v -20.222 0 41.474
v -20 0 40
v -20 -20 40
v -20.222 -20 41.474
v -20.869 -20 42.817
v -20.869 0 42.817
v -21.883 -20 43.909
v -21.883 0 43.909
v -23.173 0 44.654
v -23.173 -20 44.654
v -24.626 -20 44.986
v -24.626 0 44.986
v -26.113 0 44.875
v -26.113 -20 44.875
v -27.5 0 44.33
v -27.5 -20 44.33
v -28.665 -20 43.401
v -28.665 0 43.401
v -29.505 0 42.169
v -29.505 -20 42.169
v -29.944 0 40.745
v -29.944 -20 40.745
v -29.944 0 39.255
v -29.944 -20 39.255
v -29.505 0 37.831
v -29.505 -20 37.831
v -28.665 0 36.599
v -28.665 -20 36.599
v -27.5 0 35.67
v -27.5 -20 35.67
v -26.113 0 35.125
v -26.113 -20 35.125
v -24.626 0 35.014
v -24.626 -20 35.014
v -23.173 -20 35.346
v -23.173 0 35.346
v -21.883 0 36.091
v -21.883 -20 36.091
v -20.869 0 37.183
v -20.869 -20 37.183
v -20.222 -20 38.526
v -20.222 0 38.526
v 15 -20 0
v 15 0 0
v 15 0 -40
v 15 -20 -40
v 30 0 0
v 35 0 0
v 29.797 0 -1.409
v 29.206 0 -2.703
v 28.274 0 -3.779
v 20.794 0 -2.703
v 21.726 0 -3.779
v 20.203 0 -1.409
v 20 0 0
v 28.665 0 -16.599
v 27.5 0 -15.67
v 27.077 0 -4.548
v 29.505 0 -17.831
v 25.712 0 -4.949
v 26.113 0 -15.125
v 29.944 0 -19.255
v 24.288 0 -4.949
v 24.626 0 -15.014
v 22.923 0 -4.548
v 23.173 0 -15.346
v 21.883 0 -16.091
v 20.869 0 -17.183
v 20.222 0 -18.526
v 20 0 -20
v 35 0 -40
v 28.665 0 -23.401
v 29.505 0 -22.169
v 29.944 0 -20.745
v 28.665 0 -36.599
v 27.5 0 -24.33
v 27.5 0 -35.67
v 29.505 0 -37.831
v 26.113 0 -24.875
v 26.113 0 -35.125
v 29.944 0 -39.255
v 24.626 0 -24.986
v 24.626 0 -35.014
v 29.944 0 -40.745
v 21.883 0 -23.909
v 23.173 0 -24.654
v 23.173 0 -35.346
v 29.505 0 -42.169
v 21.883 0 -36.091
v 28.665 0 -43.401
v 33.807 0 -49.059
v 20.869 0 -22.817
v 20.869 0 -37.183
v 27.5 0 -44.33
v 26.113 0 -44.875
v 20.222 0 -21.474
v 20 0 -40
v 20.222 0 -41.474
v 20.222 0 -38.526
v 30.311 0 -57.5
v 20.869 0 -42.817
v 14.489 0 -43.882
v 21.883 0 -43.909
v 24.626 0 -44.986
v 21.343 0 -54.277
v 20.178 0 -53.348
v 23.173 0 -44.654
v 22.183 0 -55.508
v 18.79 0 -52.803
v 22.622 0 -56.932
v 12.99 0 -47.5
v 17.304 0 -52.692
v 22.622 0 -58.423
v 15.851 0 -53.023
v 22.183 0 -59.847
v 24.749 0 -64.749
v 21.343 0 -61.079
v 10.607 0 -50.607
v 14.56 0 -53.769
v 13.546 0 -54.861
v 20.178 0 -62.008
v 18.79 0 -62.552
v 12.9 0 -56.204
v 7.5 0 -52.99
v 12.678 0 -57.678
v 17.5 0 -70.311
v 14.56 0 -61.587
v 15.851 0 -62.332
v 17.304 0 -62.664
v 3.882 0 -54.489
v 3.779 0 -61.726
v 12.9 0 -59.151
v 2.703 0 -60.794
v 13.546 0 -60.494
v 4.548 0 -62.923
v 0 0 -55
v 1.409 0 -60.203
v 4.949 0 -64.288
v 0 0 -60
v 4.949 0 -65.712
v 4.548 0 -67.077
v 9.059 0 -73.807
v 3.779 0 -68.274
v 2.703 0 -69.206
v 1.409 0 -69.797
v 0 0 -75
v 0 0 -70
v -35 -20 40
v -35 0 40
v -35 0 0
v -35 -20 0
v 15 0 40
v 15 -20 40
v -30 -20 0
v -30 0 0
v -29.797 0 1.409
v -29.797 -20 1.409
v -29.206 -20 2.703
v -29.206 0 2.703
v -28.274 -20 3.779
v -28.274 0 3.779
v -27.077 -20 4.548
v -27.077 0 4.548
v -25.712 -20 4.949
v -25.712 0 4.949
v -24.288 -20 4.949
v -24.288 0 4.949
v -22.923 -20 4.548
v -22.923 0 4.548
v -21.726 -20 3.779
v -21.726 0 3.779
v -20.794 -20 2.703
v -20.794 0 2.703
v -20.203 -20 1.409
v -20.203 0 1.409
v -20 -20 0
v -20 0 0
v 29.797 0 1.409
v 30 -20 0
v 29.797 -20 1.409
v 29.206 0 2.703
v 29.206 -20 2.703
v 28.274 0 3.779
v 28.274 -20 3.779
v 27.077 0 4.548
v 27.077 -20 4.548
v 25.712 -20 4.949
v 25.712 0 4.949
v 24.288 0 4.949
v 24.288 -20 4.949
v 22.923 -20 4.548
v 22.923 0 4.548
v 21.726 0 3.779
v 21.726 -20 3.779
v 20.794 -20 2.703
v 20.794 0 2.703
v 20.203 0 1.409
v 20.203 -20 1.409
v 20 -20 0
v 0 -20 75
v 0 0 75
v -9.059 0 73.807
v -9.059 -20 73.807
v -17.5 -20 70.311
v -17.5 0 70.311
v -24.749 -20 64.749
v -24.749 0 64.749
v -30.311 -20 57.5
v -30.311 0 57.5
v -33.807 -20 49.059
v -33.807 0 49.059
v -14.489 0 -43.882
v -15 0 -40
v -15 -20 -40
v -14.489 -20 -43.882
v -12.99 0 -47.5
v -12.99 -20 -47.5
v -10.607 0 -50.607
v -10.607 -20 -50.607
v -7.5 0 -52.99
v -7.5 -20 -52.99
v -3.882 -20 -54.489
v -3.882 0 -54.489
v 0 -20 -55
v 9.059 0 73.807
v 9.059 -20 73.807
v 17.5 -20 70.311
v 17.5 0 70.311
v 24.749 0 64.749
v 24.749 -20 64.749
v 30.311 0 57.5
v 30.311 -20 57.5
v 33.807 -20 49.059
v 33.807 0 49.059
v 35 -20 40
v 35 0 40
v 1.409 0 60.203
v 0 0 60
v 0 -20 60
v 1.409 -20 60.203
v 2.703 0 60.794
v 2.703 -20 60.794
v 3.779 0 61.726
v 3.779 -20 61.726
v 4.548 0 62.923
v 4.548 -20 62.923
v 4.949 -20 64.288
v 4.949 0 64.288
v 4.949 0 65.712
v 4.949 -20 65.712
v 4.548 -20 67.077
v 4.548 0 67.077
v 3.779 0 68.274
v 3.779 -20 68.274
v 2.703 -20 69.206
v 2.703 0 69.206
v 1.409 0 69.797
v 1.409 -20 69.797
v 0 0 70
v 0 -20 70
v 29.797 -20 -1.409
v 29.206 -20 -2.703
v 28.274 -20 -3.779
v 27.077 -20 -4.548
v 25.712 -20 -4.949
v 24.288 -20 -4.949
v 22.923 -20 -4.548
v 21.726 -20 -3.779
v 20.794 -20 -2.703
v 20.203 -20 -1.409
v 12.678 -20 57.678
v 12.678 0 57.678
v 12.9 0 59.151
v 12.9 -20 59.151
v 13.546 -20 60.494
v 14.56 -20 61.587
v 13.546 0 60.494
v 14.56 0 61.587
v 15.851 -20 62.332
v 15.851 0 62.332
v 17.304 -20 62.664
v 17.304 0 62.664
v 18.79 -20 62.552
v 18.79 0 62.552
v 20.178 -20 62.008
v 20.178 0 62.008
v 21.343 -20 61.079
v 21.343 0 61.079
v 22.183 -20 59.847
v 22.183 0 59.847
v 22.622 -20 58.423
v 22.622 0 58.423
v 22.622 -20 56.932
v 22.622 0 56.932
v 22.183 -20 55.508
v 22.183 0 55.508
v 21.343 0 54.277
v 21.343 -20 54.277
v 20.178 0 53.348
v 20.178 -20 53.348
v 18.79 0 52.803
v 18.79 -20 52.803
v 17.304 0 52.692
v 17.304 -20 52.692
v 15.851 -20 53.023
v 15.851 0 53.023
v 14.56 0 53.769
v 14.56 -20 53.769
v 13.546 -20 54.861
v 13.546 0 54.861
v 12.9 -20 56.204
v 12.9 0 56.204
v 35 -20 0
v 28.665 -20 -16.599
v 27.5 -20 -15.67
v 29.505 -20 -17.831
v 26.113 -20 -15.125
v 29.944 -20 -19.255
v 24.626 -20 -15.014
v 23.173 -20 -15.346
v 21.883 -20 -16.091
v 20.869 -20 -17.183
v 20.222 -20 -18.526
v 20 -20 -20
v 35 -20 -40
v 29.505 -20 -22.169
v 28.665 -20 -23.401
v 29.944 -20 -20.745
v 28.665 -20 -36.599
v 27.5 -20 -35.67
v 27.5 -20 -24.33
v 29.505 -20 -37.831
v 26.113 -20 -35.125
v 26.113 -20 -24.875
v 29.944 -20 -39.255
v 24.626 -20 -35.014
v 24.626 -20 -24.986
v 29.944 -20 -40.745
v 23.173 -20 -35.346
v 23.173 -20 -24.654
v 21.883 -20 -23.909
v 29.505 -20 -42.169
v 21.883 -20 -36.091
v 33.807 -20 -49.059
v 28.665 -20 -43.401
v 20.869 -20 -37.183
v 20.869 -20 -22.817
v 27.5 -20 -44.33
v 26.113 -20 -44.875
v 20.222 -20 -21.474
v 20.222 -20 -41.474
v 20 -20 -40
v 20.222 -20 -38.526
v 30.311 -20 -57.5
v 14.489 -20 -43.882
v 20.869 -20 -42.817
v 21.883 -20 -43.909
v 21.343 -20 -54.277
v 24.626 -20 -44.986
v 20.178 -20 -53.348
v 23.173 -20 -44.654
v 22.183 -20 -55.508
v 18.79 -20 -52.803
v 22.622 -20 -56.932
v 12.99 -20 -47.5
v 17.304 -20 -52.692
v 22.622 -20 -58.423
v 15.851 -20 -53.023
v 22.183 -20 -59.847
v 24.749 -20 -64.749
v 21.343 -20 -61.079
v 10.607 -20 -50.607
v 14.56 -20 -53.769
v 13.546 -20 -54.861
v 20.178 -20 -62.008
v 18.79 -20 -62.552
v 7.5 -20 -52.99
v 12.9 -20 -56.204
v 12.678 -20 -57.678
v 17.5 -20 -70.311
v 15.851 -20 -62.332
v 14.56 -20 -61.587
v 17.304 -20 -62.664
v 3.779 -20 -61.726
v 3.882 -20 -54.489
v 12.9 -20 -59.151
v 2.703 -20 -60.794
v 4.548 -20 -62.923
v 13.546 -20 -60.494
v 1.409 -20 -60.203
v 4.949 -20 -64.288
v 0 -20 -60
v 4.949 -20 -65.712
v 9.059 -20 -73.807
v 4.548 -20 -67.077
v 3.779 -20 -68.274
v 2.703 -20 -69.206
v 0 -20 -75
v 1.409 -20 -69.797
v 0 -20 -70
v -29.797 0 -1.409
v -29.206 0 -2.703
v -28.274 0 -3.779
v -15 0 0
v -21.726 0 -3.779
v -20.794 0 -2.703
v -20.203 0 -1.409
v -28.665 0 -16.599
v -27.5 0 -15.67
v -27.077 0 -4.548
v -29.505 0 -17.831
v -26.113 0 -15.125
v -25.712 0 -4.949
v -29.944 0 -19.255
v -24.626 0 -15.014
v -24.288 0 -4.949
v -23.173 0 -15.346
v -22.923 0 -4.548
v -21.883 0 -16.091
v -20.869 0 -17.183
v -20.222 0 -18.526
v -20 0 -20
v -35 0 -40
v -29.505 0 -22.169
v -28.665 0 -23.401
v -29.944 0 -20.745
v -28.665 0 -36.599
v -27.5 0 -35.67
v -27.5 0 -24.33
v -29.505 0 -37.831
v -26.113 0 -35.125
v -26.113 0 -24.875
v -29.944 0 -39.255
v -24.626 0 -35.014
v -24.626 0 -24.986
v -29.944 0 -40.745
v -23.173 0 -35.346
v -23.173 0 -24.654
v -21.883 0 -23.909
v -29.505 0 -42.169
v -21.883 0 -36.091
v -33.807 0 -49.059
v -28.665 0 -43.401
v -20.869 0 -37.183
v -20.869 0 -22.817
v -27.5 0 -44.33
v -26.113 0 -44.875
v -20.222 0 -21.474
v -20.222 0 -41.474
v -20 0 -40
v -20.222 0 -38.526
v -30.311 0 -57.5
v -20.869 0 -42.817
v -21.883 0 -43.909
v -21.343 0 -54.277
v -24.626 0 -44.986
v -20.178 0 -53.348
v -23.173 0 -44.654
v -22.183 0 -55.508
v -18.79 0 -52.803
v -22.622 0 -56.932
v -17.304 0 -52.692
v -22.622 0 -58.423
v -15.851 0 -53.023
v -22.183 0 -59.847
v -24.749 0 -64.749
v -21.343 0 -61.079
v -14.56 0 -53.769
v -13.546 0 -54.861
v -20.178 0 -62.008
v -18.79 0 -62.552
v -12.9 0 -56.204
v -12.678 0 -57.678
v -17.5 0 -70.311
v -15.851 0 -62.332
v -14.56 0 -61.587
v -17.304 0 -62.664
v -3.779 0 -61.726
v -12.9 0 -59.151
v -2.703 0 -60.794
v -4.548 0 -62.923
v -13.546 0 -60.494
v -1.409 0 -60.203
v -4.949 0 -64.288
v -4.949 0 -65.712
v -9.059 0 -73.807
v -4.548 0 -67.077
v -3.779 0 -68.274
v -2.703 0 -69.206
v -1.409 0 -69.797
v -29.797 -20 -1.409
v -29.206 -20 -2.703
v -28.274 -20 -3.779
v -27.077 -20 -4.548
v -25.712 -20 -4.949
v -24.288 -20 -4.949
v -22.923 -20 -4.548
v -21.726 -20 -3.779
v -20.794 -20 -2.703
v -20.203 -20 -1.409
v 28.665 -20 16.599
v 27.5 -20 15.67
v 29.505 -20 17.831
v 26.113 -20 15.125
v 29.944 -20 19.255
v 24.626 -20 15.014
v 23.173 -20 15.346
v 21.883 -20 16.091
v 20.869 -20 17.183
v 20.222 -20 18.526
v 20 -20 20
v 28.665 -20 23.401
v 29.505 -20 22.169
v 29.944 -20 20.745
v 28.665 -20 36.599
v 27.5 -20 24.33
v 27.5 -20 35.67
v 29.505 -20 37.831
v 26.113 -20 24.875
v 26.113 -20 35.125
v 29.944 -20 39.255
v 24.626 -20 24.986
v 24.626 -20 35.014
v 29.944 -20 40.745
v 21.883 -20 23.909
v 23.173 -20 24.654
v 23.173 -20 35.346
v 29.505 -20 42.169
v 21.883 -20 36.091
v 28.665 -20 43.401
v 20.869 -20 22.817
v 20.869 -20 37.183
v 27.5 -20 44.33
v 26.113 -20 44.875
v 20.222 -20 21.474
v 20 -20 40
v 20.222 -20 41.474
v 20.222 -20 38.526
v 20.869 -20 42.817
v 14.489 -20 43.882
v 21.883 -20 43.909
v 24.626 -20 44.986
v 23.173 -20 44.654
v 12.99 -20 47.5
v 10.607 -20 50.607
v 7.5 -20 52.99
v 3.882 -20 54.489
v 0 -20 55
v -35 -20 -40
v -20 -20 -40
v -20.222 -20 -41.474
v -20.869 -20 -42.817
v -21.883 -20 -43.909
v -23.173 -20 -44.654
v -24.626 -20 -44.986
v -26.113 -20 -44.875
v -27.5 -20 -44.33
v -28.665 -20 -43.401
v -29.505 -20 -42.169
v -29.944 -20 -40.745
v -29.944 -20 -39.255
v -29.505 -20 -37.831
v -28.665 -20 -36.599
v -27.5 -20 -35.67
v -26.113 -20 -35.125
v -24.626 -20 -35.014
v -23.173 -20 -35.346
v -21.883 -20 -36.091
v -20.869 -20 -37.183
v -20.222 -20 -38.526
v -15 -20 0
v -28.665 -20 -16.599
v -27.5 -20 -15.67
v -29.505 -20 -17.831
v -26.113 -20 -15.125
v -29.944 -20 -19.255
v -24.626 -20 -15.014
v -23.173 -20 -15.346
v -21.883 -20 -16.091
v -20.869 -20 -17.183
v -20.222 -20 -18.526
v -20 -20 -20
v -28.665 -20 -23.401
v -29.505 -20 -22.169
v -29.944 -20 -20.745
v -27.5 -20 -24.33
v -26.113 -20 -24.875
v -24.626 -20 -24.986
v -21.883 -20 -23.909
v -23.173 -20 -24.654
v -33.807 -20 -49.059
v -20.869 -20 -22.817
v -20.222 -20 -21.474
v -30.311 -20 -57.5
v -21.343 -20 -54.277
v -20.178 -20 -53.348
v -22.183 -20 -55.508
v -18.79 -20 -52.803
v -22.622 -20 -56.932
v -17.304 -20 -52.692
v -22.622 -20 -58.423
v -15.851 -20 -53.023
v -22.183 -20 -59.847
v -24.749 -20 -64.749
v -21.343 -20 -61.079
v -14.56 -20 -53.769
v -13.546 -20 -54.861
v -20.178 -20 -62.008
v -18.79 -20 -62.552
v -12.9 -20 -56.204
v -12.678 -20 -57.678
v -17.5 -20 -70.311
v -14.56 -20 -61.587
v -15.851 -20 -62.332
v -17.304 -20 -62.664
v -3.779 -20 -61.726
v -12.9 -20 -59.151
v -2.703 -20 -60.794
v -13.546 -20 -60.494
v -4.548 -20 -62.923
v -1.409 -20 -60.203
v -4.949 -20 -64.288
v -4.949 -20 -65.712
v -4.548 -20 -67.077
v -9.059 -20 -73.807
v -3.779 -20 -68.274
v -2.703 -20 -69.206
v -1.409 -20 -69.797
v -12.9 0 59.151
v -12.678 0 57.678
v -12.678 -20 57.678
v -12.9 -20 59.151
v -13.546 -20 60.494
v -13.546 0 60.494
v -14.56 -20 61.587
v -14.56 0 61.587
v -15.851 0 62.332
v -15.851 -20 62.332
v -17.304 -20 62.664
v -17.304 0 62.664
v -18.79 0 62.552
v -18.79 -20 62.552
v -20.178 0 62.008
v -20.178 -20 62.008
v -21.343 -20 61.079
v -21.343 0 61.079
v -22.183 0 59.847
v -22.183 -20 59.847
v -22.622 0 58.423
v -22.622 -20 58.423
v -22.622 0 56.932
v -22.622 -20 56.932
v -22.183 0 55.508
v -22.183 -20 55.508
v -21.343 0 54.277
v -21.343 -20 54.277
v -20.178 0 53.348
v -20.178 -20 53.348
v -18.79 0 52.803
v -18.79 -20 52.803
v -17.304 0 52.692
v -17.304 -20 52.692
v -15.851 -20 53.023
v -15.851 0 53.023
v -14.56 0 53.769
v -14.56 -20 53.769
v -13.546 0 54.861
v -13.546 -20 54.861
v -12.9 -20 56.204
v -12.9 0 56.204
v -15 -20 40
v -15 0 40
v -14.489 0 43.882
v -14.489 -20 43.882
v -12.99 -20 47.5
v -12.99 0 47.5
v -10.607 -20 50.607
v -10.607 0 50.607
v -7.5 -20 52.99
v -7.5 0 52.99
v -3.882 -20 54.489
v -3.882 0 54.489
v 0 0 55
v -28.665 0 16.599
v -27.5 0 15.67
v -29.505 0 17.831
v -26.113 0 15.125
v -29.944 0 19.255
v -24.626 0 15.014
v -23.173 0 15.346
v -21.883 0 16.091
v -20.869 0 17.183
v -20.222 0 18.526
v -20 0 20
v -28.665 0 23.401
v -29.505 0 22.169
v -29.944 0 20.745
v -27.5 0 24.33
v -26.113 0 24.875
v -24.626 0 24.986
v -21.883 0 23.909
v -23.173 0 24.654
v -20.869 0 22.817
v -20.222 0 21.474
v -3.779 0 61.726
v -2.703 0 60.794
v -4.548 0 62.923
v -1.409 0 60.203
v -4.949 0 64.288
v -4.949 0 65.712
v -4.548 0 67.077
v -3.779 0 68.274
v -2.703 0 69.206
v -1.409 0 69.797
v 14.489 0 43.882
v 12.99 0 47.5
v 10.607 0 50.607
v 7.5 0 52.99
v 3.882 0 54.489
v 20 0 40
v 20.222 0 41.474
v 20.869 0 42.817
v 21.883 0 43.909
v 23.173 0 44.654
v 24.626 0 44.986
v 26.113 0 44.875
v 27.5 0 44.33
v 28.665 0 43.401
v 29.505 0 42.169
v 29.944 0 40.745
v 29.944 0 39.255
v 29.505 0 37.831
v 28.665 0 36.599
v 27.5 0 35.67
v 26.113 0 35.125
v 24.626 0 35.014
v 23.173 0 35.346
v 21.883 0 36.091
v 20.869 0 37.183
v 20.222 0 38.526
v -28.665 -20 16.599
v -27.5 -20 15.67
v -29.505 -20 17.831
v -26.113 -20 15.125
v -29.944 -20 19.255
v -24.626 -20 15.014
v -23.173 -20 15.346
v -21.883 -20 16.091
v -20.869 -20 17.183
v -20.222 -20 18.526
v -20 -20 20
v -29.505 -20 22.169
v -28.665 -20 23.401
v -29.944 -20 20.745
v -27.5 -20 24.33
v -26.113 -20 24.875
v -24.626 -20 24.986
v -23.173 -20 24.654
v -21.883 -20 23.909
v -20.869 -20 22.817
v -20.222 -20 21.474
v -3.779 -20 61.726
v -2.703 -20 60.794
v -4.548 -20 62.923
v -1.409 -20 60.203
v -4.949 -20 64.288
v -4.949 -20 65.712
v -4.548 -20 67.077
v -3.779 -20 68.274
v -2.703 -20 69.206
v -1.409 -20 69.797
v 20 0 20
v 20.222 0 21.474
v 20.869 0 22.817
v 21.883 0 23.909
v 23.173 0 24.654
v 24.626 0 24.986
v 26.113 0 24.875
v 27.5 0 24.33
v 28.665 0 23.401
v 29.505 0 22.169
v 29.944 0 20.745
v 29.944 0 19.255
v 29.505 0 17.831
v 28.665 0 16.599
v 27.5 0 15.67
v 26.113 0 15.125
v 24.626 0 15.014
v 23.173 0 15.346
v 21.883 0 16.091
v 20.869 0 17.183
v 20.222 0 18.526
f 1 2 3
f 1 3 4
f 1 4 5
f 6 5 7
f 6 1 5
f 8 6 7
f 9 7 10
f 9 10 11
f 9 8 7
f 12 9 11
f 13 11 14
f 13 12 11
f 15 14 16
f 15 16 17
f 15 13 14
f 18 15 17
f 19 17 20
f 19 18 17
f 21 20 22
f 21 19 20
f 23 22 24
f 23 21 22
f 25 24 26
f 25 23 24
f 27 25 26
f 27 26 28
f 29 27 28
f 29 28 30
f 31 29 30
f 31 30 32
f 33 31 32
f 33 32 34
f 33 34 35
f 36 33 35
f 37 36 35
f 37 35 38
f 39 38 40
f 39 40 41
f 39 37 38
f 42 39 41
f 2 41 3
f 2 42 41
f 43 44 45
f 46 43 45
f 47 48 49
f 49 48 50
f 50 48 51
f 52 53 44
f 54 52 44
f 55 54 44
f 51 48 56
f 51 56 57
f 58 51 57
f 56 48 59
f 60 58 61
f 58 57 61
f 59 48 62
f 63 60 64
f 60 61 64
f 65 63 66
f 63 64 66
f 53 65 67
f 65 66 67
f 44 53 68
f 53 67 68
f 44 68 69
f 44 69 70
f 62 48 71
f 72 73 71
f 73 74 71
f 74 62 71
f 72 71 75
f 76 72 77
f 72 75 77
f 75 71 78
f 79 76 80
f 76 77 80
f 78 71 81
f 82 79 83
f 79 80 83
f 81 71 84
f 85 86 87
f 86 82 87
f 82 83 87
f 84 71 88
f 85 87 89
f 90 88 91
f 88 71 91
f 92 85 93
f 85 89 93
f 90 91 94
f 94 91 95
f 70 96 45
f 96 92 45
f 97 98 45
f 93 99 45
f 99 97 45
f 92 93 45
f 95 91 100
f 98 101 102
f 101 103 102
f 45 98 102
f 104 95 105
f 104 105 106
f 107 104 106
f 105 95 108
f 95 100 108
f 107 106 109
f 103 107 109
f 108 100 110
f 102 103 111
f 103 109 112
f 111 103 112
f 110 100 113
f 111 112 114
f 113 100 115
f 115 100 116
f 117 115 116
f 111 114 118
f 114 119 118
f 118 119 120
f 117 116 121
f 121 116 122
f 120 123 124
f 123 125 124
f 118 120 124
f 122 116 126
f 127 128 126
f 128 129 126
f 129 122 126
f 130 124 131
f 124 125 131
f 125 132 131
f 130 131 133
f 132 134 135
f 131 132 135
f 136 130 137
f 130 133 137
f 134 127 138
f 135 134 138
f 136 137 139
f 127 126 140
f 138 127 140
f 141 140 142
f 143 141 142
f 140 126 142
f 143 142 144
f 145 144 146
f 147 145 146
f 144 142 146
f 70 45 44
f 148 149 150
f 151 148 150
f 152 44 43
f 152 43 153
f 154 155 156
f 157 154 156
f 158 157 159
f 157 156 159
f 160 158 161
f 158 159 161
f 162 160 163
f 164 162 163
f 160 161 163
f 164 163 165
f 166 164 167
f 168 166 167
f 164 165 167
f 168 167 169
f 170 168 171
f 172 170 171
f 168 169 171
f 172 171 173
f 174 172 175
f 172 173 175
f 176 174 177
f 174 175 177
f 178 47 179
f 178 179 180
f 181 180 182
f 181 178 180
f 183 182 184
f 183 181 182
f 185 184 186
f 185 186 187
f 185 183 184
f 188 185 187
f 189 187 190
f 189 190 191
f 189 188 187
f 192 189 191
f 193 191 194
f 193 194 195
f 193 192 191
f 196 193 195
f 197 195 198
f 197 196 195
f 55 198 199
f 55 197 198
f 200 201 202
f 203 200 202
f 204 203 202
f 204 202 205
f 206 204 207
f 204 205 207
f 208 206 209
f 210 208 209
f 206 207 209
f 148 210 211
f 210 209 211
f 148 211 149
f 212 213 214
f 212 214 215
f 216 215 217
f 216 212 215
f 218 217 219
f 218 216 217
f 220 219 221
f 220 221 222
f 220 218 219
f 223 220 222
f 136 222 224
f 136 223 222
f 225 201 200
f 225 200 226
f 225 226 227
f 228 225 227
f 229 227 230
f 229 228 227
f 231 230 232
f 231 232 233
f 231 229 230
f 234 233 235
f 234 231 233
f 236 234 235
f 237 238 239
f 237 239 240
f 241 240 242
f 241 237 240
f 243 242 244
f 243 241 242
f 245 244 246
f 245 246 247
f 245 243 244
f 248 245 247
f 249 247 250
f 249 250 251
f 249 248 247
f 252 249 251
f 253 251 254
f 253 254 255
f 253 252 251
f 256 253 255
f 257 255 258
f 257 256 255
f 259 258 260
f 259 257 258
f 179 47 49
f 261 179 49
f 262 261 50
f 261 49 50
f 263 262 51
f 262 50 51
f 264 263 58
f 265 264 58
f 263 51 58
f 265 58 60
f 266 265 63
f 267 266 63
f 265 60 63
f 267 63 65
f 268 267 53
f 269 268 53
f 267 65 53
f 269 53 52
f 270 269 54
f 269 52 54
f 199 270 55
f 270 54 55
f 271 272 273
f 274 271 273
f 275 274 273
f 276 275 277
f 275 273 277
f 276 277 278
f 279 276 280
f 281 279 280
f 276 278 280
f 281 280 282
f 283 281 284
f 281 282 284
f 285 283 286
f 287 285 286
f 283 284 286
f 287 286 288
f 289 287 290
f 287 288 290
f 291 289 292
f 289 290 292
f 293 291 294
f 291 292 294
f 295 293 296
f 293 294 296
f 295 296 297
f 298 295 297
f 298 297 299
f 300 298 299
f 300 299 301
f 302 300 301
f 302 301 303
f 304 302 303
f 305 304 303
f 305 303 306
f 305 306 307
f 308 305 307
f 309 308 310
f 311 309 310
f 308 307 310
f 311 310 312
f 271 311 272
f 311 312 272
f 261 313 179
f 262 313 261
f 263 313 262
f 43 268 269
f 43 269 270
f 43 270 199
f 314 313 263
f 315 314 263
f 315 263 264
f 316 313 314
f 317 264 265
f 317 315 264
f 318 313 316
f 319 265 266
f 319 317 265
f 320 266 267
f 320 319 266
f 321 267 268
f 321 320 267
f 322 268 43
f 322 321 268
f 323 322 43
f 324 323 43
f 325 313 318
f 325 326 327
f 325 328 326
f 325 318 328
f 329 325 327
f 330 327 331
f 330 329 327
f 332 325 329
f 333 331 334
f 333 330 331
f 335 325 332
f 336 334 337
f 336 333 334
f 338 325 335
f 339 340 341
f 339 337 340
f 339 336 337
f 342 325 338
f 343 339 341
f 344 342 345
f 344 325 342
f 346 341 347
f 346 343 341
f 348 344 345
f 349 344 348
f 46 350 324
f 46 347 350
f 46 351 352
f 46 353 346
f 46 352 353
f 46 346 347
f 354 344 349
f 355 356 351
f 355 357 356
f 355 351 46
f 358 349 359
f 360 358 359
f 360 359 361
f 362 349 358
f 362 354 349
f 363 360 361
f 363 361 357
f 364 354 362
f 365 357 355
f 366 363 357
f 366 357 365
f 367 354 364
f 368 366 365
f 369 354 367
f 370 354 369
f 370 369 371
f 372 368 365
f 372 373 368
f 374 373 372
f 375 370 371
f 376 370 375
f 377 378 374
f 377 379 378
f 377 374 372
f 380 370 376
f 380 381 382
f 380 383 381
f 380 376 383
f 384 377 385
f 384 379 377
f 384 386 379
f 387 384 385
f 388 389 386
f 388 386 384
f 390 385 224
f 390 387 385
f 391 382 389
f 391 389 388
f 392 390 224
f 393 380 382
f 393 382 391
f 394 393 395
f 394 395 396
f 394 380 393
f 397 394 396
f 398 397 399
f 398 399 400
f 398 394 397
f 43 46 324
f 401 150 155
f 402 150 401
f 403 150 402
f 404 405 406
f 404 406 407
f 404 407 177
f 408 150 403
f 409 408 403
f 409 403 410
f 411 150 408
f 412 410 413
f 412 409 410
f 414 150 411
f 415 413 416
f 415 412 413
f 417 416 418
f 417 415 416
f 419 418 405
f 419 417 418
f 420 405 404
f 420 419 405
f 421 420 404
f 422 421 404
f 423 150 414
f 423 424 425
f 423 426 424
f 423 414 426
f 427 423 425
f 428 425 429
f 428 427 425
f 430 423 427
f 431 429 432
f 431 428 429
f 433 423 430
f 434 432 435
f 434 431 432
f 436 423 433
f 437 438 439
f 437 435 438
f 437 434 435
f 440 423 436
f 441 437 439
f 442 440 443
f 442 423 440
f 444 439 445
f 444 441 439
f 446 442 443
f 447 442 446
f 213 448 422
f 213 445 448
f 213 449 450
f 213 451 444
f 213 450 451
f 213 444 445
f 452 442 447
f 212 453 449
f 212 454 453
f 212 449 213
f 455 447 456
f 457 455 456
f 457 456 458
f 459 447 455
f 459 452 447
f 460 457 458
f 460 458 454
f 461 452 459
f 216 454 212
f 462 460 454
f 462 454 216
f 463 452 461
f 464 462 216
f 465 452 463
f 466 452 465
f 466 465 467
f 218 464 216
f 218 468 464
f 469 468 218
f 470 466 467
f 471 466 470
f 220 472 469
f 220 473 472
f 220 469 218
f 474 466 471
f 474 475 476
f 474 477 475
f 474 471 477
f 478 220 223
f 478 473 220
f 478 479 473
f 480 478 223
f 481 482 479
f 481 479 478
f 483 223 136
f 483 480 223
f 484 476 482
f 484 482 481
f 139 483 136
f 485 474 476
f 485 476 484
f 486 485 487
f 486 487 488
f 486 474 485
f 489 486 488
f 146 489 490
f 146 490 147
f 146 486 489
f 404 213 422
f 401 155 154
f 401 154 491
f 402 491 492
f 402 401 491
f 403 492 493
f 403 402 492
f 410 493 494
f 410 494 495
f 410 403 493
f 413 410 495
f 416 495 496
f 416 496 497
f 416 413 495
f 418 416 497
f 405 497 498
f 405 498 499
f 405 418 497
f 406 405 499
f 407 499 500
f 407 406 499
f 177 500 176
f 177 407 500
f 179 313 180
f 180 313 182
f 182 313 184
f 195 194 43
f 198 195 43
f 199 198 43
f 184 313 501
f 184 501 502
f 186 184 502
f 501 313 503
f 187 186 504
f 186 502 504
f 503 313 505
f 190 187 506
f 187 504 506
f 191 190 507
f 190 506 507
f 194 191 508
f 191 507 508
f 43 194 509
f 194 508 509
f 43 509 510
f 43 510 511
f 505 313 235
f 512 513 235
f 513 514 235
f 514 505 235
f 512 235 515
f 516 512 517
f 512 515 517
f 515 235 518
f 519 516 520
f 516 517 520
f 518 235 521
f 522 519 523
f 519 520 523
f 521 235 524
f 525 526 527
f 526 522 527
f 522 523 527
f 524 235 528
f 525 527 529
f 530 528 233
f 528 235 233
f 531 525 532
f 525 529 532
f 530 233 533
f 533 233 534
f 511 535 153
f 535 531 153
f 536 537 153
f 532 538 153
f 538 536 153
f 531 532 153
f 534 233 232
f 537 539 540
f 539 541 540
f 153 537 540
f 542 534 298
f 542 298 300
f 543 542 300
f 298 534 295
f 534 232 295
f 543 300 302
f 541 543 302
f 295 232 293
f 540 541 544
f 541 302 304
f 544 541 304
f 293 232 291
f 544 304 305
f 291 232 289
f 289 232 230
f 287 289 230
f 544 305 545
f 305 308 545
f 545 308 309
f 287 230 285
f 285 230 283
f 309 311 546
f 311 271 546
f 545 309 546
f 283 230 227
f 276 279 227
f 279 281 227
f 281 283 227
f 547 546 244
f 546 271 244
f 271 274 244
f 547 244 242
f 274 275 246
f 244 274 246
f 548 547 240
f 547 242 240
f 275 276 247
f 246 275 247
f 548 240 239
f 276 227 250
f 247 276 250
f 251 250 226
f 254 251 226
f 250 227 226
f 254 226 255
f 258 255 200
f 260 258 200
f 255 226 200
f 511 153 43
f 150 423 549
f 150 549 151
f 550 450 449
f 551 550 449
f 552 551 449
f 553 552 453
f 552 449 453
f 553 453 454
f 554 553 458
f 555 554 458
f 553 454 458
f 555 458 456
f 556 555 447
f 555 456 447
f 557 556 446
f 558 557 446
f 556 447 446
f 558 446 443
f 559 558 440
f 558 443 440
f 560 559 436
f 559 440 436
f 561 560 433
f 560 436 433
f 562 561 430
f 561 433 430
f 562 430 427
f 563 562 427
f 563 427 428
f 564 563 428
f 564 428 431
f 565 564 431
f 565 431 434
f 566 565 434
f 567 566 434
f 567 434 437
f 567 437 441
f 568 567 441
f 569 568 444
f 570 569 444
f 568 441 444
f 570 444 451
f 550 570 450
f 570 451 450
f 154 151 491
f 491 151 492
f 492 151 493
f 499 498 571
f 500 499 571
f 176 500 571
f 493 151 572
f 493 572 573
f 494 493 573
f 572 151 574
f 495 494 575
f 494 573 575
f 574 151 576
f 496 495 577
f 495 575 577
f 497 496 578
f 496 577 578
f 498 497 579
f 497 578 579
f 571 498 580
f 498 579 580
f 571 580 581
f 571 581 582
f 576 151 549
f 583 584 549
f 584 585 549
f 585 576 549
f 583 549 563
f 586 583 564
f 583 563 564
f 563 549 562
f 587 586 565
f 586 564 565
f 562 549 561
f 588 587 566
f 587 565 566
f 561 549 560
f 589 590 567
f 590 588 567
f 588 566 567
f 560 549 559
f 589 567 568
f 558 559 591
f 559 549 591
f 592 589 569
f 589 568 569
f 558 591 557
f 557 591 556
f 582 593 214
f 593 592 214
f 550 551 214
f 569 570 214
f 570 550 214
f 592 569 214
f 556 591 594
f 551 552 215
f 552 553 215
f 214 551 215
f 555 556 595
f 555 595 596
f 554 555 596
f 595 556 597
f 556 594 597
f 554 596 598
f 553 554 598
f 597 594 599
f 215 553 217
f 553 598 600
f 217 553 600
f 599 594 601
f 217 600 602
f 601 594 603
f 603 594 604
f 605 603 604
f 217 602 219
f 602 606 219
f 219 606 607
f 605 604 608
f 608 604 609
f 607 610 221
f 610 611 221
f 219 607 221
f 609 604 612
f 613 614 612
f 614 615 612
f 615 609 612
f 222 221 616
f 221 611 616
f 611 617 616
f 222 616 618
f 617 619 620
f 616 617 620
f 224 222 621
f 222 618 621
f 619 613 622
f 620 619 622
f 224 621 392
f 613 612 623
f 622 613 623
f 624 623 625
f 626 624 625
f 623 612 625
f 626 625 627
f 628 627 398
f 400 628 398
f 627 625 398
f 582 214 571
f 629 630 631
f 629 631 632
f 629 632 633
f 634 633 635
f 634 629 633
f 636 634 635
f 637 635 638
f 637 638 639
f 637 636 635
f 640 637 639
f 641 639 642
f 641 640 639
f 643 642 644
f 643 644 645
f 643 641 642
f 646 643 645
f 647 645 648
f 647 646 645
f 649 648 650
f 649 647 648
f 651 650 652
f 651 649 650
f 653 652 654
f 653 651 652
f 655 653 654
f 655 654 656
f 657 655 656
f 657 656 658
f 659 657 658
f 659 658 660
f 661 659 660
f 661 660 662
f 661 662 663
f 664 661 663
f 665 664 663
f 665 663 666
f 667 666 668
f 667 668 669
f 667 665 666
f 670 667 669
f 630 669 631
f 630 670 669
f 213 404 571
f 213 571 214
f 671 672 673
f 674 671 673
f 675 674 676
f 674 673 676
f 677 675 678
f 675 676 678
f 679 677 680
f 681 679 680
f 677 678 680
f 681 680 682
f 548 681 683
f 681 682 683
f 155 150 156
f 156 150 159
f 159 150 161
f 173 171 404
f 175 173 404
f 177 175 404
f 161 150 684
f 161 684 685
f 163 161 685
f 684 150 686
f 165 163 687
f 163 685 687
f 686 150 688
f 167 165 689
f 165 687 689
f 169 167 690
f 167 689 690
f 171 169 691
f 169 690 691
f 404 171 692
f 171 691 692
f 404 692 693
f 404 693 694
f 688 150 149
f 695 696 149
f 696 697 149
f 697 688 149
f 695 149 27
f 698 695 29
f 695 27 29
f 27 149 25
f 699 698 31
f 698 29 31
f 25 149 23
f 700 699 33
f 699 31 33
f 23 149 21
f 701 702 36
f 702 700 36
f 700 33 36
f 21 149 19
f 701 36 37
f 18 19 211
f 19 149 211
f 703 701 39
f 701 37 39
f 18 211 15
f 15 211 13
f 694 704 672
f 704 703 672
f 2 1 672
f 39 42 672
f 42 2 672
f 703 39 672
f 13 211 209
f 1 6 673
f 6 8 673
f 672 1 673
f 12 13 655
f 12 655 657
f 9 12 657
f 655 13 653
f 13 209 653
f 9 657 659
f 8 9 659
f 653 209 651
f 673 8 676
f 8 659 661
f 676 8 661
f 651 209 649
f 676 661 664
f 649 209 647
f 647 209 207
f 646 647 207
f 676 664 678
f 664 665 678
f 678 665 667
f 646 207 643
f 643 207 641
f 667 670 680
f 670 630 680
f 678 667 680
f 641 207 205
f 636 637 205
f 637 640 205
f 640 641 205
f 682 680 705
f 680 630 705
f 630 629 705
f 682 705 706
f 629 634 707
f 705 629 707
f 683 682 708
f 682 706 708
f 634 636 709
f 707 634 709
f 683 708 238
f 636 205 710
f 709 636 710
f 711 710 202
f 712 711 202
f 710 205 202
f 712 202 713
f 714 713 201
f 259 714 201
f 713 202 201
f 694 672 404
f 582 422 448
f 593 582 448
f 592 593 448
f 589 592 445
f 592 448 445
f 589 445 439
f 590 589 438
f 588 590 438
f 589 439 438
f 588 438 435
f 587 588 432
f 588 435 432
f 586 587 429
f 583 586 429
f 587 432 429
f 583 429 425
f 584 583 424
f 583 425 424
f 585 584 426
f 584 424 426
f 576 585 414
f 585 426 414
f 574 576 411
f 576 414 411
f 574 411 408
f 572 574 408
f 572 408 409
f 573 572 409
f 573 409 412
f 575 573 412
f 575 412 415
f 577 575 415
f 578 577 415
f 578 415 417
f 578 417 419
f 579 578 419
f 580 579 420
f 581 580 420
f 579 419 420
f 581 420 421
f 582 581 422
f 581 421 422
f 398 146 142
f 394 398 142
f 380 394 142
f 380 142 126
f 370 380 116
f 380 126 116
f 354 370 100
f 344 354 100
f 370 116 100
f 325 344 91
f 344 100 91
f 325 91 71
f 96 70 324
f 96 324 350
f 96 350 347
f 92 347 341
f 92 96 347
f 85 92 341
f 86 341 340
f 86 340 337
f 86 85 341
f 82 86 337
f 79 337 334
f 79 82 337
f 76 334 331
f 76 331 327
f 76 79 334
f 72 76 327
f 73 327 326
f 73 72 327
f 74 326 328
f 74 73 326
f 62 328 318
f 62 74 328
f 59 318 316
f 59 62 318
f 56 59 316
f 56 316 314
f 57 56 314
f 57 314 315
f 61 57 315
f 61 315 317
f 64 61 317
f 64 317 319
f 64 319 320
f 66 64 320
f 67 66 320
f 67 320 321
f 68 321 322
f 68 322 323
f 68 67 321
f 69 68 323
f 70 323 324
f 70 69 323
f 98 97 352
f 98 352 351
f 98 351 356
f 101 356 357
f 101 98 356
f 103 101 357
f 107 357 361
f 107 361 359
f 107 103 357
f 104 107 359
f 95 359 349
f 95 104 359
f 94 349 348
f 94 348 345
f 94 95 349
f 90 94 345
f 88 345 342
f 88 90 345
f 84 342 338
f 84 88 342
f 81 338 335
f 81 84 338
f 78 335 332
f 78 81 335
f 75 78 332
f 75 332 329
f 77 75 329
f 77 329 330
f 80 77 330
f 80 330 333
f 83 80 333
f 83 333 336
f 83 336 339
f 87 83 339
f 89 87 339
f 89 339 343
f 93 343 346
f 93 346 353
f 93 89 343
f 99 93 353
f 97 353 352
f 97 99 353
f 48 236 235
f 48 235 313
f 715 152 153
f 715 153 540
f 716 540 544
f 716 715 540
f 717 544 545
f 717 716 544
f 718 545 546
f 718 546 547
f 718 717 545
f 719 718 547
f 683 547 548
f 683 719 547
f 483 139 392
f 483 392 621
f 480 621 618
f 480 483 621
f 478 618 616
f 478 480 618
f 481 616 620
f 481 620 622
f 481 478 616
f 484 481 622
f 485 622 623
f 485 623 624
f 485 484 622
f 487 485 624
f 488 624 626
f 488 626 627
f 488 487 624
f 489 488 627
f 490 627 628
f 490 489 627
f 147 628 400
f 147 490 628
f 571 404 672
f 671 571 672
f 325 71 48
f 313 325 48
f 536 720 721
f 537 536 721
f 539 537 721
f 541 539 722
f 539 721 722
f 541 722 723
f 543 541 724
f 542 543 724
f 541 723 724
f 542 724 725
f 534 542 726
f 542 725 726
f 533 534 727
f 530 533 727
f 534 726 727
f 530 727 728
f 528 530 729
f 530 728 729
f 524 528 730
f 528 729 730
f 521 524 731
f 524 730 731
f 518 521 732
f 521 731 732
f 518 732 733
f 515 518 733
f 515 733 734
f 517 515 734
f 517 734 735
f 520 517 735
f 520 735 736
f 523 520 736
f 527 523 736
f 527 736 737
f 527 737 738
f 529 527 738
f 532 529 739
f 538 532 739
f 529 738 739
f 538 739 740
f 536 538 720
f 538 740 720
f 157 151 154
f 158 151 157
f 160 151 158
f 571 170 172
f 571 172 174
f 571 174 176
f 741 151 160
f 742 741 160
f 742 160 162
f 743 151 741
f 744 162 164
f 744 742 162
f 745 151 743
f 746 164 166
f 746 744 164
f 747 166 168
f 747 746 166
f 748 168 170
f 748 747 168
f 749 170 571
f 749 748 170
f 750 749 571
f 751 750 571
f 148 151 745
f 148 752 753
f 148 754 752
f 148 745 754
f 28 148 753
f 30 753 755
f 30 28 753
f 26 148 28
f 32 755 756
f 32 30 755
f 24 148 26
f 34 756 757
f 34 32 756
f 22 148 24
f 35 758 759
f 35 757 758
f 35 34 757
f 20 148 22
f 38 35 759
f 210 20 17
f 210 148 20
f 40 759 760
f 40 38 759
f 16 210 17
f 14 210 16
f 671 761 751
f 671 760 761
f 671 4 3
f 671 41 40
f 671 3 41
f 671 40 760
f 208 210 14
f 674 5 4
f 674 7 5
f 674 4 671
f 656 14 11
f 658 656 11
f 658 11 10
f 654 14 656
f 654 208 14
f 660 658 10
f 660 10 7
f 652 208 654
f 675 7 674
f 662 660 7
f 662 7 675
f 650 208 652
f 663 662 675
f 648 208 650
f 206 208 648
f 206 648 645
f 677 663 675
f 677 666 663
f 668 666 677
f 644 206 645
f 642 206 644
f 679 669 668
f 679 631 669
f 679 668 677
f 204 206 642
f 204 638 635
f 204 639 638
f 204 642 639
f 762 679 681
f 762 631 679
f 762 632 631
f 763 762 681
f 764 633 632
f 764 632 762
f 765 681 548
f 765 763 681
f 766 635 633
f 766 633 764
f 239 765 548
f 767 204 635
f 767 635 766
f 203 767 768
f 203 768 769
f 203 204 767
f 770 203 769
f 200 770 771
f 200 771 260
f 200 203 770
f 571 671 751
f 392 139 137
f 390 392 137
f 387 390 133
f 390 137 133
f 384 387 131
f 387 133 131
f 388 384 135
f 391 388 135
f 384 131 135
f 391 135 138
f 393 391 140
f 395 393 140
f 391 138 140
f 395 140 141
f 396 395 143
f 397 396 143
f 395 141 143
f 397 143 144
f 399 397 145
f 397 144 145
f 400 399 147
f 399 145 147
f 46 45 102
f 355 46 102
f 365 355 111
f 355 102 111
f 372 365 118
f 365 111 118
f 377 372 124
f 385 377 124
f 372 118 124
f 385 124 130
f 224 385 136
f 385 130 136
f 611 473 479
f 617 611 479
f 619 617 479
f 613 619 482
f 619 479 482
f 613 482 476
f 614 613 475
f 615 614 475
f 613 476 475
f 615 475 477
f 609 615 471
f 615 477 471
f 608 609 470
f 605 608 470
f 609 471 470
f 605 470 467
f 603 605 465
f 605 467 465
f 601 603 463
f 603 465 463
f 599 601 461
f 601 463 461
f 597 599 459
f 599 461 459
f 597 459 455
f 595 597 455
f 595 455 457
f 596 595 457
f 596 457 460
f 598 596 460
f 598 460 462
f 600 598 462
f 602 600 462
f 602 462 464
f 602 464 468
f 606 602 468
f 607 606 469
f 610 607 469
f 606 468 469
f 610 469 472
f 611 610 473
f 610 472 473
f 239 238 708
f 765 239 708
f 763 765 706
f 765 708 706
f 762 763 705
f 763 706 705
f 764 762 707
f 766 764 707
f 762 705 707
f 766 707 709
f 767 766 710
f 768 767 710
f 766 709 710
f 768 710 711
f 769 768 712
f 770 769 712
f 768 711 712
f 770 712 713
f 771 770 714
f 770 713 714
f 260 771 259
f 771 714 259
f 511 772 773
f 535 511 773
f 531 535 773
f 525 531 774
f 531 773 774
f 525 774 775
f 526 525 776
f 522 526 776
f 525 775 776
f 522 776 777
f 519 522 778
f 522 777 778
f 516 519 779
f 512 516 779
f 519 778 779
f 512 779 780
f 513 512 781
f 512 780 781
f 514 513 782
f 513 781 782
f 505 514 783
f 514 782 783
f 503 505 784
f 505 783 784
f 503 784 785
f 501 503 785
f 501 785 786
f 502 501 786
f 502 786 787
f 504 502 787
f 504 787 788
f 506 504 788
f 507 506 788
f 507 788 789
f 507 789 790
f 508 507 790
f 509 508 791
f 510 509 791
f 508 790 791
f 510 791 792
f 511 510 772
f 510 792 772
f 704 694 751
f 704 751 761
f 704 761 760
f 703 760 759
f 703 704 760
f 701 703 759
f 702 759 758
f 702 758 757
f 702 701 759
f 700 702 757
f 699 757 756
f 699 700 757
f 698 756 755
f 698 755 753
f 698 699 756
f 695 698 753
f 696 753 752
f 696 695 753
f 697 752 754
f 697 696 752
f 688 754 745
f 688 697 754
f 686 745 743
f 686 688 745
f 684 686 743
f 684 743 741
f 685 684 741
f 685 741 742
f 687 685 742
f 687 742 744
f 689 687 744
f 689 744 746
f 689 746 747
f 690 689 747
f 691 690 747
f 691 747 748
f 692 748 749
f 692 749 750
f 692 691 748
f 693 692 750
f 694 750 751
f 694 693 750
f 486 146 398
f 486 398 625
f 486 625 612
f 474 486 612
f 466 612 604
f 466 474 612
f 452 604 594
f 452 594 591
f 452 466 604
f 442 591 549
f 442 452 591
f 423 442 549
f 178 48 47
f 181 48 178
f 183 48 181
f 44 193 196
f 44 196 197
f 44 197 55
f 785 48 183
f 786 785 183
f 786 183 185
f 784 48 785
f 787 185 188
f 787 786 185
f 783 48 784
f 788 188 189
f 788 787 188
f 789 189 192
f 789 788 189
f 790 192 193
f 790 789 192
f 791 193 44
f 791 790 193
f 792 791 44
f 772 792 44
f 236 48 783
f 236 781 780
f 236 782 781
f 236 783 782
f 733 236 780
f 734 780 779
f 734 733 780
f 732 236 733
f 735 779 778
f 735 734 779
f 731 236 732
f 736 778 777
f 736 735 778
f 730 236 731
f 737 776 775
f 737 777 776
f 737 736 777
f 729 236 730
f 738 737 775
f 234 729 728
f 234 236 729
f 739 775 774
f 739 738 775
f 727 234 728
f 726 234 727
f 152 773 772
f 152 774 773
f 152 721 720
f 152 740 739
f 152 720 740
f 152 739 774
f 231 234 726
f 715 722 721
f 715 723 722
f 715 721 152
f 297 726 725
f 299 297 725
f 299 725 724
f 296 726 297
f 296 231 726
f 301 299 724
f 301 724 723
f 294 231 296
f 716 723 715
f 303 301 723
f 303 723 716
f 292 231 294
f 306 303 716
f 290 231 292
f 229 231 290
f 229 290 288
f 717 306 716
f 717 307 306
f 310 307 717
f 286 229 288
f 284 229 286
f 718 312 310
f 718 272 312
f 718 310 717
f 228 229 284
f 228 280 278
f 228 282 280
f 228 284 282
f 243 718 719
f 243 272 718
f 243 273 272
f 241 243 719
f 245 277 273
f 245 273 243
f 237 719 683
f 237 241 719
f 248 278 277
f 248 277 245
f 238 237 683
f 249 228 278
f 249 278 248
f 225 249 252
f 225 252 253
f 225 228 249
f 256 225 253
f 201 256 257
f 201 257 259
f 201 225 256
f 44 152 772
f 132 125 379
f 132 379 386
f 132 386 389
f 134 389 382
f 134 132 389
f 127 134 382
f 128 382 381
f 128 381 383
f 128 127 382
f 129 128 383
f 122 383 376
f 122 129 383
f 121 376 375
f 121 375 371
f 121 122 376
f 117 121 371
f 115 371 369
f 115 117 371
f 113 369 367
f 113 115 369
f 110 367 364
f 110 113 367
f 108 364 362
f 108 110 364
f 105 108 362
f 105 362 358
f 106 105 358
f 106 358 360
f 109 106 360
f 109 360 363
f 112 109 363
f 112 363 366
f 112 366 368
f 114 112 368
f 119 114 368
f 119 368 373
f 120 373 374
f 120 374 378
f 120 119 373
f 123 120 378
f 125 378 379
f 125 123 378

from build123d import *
from build123d import SkipClean  # not in build123d's __all__

# Parameters (mm, degrees)
F0_R     = 5
F1_DEPTH = 20


with BuildPart() as f1:
    # F0 (on Front) → F1 (new body)
    with BuildSketch(Plane.XZ):
        with BuildLine():
            Line((-15, 0), (-15, 40))
            ThreePointArc((-15, 40), (-10.6066017178, 50.6066017178), (0, 55))
            Line((0, 55), (0, 60))
            ThreePointArc((0, 60), (-5, 65), (0, 70))
            Line((0, 70), (0, 75))
            ThreePointArc((0, 75), (-24.7487373415, 64.7487373415), (-35, 40))
            Line((-35, 40), (-35, 0))
            Line((-35, 0), (-30, 0))
            ThreePointArc((-30, 0), (-25, 5), (-20, 0))
            Line((-20, 0), (-15, 0))
        make_face()
        with Locations((-25, 20)):
            Circle(F0_R, mode=Mode.SUBTRACT)
        with Locations((-25, 40)):
            Circle(F0_R, mode=Mode.SUBTRACT)
        with Locations((-17.6776695297, 57.6776695297)):
            Circle(F0_R, mode=Mode.SUBTRACT)
    extrude(amount=F1_DEPTH)

    # F2: F1 across plane


with BuildPart() as f1_1:
    add(f1.part, clean=False)
    with SkipClean():  # cleaning this boolean's faces spoils the solid; the shape is the same uncleaned
        add(f1.part.mirror(Plane.YZ), clean=False)

    # F3: F1 across plane


with BuildPart() as f1_2:
    add(f1_1.part, clean=False)
    with SkipClean():  # cleaning this boolean's faces spoils the solid; the shape is the same uncleaned
        add(f1_1.part.mirror(Plane.XY), clean=False)


solid = f1_2.part
